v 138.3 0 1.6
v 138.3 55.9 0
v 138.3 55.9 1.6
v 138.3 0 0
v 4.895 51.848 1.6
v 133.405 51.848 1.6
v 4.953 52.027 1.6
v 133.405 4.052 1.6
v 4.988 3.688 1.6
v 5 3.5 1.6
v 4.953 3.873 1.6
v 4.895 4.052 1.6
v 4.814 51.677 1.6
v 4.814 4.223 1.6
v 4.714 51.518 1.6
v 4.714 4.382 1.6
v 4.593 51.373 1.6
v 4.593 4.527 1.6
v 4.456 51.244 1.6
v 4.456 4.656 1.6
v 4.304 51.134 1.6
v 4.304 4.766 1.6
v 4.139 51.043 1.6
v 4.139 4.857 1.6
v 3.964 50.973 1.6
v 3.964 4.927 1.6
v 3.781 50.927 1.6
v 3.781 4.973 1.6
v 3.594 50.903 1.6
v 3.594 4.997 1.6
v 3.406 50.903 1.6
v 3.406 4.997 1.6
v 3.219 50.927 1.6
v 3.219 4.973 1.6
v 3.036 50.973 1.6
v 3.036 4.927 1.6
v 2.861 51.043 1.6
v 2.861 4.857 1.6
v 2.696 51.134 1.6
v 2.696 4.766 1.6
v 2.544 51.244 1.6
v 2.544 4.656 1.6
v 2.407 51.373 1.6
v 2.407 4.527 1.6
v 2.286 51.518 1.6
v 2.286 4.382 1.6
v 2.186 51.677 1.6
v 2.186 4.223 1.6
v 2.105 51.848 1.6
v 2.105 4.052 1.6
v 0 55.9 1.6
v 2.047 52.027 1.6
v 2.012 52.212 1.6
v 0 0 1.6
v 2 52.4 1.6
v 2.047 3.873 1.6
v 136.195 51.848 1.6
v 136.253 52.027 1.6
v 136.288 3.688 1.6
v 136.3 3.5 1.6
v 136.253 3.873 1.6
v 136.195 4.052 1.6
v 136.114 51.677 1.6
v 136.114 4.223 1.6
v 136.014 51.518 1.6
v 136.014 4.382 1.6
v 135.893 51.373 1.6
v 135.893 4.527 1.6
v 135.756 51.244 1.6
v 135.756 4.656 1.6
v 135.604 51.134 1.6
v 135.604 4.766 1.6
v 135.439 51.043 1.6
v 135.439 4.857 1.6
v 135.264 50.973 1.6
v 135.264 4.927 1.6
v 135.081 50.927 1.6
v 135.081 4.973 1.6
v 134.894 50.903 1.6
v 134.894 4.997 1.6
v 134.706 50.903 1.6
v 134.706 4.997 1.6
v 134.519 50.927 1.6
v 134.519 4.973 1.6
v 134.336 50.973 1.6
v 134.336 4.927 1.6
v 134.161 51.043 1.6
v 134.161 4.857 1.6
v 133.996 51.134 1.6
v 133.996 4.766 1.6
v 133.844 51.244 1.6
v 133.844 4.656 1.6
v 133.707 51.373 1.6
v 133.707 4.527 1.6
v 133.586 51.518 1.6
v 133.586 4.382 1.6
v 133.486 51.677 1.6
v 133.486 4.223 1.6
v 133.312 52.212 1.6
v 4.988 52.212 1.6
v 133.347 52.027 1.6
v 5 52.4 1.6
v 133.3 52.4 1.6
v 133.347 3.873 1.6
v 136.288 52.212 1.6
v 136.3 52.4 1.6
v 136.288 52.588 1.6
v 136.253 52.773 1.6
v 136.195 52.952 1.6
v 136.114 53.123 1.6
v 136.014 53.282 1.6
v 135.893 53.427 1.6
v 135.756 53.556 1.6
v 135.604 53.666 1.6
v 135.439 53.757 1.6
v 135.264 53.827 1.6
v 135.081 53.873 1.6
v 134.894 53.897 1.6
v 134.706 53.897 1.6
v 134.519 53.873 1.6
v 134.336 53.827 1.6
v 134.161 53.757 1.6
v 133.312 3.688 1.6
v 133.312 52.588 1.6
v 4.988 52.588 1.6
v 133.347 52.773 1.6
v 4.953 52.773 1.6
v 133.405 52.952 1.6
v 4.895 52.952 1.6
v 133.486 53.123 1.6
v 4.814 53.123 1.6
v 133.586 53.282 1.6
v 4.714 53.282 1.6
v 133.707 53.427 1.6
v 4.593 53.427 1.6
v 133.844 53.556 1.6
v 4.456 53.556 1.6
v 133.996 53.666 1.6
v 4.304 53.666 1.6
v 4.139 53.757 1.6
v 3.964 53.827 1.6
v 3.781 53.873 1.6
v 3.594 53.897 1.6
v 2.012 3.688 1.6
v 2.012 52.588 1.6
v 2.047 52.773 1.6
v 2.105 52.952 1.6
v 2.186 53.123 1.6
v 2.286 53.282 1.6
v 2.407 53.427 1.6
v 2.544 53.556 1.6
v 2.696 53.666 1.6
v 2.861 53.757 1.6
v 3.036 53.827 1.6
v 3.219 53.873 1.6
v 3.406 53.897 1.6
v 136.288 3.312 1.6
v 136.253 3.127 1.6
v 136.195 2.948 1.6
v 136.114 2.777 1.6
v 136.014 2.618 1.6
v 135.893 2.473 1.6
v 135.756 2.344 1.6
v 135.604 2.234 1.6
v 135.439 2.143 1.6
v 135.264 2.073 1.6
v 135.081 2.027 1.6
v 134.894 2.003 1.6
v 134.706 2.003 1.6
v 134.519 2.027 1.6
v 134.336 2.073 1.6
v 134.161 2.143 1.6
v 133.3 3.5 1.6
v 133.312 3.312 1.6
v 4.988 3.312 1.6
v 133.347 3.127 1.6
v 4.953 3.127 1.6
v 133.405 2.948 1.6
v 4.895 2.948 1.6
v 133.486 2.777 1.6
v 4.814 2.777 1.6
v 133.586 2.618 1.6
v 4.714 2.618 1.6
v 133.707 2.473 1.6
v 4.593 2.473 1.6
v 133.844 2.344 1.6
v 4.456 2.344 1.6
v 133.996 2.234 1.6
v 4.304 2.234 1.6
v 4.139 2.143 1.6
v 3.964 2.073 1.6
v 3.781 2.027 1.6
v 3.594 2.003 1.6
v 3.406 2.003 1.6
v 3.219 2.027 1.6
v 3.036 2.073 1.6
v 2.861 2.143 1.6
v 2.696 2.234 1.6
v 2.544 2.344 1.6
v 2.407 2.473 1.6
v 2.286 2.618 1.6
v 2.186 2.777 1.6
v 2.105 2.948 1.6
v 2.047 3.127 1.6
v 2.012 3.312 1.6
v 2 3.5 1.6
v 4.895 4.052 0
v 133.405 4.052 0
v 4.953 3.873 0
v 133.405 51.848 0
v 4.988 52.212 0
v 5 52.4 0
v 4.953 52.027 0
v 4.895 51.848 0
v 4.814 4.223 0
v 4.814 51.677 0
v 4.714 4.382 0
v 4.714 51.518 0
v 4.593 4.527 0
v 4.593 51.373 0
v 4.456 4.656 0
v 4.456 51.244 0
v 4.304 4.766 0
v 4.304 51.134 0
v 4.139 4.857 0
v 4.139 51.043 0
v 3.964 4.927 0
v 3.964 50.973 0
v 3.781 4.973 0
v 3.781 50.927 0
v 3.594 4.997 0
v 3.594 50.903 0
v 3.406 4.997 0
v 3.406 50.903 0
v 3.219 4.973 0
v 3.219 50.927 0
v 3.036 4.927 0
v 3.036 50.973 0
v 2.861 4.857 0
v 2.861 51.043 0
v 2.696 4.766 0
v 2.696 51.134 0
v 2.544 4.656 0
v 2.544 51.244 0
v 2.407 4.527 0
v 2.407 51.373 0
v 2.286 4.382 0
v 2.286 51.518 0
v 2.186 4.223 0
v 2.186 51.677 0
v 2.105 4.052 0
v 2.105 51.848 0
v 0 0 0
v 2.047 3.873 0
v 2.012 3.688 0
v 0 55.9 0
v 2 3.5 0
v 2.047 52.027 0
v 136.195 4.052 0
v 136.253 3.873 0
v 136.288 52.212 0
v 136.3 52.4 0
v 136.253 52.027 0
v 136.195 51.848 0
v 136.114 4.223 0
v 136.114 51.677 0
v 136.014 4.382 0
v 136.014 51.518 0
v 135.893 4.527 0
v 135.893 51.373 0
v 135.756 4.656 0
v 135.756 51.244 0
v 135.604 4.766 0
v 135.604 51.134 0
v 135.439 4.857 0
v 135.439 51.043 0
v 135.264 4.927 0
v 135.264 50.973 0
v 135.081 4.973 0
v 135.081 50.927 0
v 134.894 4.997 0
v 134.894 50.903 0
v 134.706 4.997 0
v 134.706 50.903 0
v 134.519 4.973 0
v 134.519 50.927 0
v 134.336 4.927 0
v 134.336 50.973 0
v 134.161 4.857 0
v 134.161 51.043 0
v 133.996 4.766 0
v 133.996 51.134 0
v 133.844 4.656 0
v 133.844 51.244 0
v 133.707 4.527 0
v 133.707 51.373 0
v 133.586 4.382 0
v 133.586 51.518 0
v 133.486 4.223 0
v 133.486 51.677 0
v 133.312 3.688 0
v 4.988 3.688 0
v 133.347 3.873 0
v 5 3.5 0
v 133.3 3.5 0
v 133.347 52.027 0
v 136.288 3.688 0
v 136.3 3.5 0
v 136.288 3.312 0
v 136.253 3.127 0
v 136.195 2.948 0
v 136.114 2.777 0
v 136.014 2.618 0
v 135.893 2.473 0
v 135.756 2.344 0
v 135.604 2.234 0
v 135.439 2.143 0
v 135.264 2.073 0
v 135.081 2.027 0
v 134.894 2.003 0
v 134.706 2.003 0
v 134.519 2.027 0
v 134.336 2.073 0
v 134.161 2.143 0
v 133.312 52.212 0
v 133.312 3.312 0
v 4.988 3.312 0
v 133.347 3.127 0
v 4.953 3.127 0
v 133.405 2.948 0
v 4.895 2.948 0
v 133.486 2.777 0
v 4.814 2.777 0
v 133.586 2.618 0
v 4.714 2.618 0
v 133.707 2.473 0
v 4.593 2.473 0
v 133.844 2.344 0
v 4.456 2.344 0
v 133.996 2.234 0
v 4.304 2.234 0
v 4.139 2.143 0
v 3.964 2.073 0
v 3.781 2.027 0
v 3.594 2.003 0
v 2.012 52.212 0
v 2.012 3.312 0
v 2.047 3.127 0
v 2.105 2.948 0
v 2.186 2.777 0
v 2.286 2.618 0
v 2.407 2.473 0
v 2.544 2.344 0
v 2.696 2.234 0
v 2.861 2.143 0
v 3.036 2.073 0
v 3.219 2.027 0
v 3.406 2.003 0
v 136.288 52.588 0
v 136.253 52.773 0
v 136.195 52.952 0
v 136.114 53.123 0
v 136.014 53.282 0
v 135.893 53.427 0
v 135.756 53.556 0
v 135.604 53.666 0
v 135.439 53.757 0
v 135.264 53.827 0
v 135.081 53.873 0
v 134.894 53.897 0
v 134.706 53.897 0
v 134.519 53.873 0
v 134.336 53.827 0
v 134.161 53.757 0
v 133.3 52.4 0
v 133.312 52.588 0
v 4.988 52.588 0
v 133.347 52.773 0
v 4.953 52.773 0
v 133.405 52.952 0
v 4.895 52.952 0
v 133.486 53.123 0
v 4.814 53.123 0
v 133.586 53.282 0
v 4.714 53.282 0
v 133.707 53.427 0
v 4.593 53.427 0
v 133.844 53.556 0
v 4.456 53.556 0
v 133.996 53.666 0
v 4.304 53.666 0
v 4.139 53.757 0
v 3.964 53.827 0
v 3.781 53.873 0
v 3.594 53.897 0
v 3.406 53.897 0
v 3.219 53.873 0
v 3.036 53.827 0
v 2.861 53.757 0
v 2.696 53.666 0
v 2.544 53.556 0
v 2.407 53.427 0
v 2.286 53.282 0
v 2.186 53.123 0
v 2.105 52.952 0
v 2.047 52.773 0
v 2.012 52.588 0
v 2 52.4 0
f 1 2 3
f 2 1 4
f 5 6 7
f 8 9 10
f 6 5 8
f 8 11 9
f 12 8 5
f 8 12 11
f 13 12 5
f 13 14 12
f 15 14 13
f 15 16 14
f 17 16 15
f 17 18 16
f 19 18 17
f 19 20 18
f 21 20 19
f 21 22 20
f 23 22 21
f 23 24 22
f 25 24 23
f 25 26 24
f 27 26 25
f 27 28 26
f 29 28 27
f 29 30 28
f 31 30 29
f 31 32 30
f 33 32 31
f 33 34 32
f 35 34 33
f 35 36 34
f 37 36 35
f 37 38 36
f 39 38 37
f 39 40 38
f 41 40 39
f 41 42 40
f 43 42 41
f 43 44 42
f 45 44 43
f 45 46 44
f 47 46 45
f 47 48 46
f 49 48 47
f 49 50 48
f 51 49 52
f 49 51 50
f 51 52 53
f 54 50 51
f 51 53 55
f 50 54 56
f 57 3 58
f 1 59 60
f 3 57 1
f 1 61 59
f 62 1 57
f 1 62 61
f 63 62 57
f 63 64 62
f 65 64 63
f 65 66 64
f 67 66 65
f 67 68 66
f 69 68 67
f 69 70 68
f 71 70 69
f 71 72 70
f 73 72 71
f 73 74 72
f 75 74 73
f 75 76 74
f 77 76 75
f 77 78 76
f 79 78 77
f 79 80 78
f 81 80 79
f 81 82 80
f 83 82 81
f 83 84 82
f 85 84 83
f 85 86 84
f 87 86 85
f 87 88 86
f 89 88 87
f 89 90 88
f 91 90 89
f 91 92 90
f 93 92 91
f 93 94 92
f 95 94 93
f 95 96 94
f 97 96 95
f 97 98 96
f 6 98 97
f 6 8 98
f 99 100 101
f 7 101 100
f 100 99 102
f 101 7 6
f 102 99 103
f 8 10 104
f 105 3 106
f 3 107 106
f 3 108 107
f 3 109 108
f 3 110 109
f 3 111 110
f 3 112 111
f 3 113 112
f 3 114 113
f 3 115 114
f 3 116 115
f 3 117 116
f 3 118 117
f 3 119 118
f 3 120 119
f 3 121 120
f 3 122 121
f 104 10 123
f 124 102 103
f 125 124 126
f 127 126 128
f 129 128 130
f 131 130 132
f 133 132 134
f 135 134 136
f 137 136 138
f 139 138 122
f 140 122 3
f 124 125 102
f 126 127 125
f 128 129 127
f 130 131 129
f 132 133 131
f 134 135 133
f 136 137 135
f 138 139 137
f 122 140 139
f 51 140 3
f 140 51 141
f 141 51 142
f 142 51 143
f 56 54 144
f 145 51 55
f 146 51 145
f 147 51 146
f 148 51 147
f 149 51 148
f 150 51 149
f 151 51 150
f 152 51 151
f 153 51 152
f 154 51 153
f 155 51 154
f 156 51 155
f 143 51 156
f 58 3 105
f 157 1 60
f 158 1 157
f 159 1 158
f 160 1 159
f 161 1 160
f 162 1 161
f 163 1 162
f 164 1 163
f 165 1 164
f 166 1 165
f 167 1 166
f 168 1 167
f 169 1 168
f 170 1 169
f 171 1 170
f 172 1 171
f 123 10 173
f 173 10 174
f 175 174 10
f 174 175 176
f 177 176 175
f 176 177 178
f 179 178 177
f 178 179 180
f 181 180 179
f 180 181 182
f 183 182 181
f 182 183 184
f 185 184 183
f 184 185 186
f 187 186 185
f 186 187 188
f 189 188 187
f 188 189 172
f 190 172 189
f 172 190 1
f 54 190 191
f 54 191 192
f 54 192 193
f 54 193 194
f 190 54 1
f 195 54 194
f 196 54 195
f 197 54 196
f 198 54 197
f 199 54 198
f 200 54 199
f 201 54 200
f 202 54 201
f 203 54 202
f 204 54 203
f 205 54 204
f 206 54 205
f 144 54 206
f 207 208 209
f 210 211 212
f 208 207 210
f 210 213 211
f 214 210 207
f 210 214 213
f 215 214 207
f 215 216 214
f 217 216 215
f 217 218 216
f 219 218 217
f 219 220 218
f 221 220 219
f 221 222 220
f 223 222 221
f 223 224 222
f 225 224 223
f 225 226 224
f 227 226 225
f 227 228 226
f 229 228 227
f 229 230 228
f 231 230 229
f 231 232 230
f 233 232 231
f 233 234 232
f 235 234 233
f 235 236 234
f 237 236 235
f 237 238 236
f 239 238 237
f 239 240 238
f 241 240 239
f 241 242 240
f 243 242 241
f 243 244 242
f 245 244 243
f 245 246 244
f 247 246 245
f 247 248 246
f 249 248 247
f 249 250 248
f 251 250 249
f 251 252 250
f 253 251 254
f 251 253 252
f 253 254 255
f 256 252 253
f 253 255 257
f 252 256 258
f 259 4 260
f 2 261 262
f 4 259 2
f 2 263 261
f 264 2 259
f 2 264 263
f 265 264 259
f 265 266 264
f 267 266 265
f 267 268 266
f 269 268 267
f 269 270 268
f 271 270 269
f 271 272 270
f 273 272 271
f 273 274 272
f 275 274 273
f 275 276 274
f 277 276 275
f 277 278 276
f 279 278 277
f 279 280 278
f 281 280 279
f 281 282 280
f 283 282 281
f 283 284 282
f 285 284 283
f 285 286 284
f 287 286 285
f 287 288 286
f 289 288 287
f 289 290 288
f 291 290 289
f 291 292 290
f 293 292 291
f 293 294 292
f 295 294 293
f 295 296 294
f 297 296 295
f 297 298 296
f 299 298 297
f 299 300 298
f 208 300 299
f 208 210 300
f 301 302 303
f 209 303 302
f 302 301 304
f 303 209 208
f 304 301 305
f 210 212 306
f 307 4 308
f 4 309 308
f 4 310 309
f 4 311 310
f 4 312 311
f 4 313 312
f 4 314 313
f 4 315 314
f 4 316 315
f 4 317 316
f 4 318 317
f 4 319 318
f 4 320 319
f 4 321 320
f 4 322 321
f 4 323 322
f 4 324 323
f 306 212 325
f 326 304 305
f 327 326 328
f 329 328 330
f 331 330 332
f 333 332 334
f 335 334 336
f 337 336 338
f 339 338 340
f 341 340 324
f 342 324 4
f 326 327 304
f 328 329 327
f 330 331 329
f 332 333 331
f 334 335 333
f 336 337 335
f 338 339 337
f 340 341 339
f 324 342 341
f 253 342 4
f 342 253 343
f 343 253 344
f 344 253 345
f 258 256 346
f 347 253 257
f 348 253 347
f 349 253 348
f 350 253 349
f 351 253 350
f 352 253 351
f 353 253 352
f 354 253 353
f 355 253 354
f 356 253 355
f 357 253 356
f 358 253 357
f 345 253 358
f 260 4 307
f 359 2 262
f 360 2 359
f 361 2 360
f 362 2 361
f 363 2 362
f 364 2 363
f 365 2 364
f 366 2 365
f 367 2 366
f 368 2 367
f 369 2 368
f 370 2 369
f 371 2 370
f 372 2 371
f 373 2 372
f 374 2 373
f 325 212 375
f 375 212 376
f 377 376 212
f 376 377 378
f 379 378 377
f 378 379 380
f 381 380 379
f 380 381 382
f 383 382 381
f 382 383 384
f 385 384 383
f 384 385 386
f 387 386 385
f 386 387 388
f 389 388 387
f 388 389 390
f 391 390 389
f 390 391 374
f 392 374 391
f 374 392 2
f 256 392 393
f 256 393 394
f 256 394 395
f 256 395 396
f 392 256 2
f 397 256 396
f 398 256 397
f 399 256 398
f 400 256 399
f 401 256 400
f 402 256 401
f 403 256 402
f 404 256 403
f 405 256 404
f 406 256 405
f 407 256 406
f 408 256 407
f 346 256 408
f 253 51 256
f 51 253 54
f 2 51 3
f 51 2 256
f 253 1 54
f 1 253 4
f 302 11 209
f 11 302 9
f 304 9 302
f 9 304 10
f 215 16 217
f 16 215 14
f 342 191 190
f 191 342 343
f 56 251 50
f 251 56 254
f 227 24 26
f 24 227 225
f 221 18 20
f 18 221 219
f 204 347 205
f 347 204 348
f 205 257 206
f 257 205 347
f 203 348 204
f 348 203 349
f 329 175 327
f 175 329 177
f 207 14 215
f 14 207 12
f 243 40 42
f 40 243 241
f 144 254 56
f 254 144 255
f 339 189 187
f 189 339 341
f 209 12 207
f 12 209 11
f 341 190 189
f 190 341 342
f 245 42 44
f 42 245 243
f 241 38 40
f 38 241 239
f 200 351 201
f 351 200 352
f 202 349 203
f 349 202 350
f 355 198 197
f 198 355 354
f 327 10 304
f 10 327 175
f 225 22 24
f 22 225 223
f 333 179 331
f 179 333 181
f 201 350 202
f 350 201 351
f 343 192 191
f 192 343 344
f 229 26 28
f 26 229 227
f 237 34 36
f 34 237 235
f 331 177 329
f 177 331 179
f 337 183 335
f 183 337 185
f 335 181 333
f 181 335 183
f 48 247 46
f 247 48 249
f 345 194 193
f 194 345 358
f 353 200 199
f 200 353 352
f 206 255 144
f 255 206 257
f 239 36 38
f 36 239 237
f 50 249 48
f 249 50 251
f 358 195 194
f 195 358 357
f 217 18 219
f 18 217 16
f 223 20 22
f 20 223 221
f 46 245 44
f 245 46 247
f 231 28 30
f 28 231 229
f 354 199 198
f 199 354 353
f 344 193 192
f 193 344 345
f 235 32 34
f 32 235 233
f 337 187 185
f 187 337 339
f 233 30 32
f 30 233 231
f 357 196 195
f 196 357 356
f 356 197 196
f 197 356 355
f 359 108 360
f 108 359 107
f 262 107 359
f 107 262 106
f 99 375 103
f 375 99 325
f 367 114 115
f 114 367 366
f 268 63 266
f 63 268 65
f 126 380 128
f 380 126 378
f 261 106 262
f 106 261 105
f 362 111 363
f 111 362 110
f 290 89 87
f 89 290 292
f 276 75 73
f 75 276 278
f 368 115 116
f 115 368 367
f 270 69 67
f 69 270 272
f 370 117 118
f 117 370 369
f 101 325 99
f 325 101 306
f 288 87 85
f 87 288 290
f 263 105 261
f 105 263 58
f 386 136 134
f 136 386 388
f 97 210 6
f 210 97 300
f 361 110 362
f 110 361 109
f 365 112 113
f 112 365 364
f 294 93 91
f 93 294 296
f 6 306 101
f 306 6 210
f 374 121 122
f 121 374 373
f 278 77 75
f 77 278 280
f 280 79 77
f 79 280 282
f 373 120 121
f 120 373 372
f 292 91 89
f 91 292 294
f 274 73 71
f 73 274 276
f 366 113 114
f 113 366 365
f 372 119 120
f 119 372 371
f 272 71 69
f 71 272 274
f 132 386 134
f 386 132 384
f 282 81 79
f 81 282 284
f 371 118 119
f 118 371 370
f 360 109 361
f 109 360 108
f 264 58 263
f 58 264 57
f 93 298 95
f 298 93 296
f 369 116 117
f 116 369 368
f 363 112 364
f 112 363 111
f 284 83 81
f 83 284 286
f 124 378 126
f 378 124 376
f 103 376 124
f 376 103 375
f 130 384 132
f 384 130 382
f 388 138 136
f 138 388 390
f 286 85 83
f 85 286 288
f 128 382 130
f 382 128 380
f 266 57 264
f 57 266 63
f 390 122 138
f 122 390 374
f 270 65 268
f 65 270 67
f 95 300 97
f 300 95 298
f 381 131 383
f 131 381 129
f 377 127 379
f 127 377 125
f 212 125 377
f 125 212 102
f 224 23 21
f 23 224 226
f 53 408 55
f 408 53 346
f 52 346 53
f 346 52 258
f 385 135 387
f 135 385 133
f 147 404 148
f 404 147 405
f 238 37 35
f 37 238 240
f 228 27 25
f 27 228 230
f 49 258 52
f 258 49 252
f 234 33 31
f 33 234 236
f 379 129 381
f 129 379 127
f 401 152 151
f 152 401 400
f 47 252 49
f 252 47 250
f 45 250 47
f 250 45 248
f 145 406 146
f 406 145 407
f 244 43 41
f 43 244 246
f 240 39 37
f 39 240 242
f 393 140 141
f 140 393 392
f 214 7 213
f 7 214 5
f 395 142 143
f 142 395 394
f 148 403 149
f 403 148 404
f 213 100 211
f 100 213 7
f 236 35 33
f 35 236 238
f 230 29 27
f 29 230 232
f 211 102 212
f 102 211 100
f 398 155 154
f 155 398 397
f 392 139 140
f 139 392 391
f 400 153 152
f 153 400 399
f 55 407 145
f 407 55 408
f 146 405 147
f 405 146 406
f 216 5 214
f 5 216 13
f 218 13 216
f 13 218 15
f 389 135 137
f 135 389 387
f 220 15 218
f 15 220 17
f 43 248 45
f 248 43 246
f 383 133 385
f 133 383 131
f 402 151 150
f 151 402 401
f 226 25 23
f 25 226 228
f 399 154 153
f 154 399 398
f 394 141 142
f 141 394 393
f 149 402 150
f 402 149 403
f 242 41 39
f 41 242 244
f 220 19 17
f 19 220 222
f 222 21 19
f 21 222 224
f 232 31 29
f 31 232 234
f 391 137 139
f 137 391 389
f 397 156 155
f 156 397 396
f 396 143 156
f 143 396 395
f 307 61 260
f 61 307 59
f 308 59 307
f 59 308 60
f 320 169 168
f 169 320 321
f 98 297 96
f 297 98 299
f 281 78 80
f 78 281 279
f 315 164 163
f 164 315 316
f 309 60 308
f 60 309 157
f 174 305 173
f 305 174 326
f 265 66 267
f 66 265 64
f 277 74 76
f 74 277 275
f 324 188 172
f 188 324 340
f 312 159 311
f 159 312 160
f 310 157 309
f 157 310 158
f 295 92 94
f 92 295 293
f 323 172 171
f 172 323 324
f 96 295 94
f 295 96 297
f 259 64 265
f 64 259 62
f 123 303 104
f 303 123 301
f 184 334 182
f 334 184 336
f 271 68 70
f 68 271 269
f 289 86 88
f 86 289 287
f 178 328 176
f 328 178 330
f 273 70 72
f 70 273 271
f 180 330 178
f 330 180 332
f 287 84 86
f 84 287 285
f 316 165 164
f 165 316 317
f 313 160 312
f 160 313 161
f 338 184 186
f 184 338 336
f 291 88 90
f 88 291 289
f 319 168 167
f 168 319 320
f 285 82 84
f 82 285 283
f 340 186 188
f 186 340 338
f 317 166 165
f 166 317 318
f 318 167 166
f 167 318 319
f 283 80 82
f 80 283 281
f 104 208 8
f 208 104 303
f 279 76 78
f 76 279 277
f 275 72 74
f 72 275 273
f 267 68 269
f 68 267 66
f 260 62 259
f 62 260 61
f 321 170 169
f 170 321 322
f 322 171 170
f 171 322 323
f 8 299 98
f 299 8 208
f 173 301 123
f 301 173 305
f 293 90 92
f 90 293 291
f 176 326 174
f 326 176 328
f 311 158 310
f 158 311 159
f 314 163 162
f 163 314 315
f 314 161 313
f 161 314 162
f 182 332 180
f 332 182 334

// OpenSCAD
$fn=50;

module miniround(size, radius) {
    x = size[0]-radius/2;
    y = size[1]-radius/2;

    minkowski()
    {
        cube(size=[x,y,size[2]]);
        cylinder(r=radius);
        // Using a sphere is possible, but will kill performance
        //sphere(r=radius);
    }
}

//cube([76.2,55.8,1.6]);
height=1.6;
//width=76.2;
width=138.3;
//depth=55.8;
depth=55.9;

//projection(cut = true) {
    difference() {
        //miniround([width,depth],height);
        cube([width,depth,height]);
        translate([3.5,3.5,0]) {
            cylinder(h=height*2,d=3);
        }
        translate([width-3.5,depth-3.5]) {
            cylinder(h=height*2,d=3);
        }
        translate([3.5,depth-3.5]) {
            cylinder(h=height*2,d=3);
        }
        translate([width-3.5,3.5]) {
            cylinder(h=height*2,d=3);
        }
    }
//}
